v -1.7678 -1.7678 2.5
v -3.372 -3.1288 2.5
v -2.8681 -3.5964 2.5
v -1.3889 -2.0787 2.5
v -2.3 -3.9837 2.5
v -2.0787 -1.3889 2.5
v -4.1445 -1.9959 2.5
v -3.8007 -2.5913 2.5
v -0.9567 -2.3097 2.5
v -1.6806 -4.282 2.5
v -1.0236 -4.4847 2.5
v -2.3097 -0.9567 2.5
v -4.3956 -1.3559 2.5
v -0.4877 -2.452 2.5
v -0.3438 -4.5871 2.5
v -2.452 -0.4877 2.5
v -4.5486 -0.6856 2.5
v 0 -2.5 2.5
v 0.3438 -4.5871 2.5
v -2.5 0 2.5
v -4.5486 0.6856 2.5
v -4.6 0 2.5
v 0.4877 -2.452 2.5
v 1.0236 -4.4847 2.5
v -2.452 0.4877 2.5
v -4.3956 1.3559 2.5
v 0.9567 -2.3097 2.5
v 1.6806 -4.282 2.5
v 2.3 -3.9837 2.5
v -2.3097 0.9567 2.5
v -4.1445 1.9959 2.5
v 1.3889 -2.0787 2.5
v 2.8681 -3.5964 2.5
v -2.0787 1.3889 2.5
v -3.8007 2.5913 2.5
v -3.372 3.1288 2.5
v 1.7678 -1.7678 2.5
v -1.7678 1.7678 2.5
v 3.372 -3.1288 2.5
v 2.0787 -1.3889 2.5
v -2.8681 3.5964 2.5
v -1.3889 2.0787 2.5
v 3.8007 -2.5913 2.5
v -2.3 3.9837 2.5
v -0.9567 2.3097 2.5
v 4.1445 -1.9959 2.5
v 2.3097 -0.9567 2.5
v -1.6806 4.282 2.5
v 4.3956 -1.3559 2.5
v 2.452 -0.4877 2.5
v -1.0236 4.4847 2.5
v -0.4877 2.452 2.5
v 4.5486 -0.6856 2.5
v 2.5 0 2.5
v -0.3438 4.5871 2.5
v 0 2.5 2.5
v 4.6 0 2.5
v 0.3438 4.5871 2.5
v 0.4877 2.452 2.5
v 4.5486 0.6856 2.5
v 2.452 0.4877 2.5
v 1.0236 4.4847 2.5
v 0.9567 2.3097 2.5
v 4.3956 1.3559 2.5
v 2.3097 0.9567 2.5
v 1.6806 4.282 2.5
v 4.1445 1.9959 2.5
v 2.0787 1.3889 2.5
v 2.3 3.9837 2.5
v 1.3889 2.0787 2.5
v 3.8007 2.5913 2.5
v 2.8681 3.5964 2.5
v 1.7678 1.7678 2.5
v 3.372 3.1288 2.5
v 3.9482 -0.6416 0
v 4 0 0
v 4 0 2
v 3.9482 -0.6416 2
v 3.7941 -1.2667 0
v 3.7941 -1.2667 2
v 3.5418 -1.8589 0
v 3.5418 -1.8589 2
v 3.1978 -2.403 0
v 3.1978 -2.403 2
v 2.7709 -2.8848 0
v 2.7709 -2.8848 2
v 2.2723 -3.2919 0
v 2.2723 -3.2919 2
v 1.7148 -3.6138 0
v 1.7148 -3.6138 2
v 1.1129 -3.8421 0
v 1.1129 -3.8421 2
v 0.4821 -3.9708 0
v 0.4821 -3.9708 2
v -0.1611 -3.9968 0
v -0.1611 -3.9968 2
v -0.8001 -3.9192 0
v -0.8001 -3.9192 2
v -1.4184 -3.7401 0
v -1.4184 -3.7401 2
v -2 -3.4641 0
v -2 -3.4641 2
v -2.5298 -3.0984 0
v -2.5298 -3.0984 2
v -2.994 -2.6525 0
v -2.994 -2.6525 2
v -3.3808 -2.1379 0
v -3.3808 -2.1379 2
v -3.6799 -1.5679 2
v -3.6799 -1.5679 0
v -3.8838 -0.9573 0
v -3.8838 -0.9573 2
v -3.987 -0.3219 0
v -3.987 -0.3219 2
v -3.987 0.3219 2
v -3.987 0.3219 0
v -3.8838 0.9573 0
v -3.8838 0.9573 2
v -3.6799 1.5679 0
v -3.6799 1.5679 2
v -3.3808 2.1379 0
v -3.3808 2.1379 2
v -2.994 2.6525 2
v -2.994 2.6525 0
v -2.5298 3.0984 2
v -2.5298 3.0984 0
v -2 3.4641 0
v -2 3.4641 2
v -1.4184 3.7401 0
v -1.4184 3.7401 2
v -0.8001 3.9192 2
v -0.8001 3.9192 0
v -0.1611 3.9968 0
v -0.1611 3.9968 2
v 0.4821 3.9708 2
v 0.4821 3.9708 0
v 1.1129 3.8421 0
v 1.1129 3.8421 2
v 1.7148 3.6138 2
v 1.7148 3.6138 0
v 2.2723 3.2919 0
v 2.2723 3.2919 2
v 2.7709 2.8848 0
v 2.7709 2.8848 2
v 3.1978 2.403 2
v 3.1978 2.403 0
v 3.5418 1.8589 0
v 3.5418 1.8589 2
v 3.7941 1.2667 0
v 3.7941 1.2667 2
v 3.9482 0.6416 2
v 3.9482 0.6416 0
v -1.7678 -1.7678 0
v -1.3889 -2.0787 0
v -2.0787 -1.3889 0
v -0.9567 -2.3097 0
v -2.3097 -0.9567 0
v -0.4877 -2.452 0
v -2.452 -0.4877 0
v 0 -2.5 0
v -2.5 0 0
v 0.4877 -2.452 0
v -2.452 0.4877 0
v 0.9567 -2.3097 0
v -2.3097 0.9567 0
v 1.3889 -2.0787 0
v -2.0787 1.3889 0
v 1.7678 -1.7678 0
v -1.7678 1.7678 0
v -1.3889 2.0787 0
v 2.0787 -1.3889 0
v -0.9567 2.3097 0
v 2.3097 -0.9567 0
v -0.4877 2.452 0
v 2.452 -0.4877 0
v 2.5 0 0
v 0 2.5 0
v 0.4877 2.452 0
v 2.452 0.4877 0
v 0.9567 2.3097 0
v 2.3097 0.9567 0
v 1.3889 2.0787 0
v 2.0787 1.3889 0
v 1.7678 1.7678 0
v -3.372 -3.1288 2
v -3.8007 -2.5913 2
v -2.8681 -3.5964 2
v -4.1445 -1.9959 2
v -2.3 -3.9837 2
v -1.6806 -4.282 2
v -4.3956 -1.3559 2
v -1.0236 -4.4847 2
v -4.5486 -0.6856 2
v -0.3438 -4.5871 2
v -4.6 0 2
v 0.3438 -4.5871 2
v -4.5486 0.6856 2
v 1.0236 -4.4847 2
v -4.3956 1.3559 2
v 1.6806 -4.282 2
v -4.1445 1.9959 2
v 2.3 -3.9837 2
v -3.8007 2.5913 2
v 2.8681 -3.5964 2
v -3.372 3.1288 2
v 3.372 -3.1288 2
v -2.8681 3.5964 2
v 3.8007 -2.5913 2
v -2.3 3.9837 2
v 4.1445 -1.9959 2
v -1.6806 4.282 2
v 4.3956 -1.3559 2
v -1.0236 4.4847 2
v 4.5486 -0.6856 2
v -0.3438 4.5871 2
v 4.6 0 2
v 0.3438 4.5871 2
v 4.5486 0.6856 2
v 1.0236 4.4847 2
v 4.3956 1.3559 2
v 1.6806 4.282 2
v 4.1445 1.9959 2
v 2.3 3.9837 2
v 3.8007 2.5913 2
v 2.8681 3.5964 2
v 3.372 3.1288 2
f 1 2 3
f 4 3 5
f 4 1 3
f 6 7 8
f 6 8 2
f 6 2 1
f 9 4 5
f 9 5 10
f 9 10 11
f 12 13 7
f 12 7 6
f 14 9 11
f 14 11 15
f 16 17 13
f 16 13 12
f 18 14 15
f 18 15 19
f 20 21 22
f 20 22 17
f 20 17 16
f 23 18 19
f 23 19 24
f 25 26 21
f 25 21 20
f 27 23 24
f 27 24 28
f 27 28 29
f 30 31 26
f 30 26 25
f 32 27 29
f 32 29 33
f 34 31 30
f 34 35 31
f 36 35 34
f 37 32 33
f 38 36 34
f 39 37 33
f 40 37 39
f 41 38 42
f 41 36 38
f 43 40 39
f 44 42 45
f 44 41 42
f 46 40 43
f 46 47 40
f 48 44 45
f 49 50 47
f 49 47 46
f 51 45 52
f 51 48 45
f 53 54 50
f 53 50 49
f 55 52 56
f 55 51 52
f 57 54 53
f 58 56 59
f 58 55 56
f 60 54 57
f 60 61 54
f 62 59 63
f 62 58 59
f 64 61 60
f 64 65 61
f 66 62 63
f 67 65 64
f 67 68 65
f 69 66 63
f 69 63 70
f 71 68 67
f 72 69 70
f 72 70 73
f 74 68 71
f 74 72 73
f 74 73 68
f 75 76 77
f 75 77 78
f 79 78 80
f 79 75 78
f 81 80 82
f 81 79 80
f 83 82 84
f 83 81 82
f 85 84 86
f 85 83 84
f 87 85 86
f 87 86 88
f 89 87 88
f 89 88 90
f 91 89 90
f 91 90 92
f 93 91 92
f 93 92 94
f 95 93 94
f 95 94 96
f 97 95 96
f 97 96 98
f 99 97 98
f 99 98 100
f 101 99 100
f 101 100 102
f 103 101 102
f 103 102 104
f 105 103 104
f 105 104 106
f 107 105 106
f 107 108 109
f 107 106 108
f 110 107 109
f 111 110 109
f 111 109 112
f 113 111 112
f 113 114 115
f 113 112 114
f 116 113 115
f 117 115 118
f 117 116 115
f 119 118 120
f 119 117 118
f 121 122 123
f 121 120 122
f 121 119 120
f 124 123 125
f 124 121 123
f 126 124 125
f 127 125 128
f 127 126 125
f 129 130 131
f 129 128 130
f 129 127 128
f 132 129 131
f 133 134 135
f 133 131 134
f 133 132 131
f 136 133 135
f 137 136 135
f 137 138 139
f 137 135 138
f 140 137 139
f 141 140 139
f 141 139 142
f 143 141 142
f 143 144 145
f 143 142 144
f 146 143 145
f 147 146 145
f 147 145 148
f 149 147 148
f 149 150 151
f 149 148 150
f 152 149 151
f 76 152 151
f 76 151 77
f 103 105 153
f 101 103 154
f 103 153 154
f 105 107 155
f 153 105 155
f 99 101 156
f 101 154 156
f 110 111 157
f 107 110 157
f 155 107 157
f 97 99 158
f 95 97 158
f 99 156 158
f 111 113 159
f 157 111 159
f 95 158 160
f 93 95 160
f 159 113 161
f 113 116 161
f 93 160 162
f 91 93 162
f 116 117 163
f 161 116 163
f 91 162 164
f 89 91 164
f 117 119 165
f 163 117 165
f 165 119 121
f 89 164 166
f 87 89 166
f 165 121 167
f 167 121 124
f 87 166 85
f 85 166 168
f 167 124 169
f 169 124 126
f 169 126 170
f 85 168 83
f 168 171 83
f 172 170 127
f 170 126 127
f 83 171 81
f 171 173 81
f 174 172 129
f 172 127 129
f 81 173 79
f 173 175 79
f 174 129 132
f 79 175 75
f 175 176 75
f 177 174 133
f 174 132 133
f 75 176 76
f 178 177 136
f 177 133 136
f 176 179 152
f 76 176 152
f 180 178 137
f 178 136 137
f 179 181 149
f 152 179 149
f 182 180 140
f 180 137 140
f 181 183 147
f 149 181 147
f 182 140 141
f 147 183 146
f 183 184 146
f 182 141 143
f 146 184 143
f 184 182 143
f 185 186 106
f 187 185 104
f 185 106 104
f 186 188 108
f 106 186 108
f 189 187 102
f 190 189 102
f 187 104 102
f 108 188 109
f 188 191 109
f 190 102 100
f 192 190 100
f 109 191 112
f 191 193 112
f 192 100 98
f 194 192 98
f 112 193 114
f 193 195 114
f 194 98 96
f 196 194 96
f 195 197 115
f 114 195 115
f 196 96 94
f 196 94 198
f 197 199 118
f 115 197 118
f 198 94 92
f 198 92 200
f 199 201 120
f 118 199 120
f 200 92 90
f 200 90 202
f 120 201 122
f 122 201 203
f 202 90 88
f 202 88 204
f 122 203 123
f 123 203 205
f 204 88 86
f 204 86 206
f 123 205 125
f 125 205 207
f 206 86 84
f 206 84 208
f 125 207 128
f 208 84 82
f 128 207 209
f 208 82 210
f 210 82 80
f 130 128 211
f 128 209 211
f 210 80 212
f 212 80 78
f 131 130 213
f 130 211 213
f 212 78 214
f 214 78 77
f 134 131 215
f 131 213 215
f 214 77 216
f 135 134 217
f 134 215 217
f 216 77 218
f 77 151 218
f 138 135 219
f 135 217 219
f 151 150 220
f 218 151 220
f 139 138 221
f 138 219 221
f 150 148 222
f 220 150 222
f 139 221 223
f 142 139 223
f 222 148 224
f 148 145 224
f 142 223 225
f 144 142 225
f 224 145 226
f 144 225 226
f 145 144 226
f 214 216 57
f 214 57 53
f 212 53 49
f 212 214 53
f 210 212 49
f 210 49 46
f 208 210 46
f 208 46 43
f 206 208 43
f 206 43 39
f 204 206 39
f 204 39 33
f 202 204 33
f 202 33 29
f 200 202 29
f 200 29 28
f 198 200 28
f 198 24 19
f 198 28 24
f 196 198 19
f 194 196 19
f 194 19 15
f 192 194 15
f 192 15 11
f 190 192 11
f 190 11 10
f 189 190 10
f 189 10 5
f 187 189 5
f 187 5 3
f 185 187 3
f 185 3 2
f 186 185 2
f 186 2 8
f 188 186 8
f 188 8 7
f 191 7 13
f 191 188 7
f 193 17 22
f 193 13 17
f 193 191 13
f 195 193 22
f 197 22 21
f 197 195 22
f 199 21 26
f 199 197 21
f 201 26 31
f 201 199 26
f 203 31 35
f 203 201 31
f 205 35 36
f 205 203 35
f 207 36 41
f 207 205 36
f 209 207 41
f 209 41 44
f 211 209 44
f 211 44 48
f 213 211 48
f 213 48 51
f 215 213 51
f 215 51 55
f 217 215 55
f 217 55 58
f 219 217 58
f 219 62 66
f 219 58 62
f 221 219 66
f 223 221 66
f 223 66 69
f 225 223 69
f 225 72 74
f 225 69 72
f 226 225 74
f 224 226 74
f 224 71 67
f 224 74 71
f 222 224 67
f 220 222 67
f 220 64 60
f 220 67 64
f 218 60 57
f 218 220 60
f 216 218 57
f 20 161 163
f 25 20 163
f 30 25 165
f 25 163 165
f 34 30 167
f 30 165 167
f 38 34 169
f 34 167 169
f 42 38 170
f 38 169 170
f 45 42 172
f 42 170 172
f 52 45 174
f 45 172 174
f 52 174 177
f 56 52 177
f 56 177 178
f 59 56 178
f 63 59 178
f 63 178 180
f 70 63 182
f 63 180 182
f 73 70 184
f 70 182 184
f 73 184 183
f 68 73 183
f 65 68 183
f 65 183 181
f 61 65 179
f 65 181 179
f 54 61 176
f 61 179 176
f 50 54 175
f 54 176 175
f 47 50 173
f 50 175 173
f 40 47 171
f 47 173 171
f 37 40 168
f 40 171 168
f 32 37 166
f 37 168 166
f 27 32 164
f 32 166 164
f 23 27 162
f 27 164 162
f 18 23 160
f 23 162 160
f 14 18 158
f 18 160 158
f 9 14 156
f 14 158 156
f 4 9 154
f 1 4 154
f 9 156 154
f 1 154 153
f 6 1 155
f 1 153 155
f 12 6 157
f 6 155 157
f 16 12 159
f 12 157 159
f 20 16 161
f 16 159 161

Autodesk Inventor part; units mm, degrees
ref_plane "YZ Plane" through (0, 0, 0) normal (1, 0, 0) x (0, 1, 0)
ref_plane "XZ Plane" through (0, 0, 0) normal (0, 1, 0) x (-1, 0, 0)
ref_plane "XY Plane" through (0, 0, 0) normal (0, 0, 1) x (1, 0, 0)
sketch "Sketch1" plane through (0, 0, 0) normal (0, 0, 1) x (1, 0, 0)
  circle A0 centre (0, 0) radius 4
  dimension "d0" = 8
extrude "Extrusion1" add sketch "Sketch1" along normal blind 2
sketch "Sketch2" plane through (0, 0, 2) normal (0, 0, 1) x (1, 0, 0)
  circle A0 centre (0, 0) radius 2.5
  circle A1 centre (0, 0) radius 4.6
  dimension "d3" = 5
  dimension "d4" = 9.2
extrude "Extrusion2" add sketch "Sketch2" along normal blind 0.5 contours A0 | A1
sketch "Sketch3" plane through (0, 0, 0) normal (0, 0, -1) x (-1, 0, 0)
  circle A0 centre (0, 0) radius 2.5
  dimension "d7" = 5
extrude "Extrusion3" cut sketch "Sketch3" against normal blind 9
properties part number "Rotation End Cap"
